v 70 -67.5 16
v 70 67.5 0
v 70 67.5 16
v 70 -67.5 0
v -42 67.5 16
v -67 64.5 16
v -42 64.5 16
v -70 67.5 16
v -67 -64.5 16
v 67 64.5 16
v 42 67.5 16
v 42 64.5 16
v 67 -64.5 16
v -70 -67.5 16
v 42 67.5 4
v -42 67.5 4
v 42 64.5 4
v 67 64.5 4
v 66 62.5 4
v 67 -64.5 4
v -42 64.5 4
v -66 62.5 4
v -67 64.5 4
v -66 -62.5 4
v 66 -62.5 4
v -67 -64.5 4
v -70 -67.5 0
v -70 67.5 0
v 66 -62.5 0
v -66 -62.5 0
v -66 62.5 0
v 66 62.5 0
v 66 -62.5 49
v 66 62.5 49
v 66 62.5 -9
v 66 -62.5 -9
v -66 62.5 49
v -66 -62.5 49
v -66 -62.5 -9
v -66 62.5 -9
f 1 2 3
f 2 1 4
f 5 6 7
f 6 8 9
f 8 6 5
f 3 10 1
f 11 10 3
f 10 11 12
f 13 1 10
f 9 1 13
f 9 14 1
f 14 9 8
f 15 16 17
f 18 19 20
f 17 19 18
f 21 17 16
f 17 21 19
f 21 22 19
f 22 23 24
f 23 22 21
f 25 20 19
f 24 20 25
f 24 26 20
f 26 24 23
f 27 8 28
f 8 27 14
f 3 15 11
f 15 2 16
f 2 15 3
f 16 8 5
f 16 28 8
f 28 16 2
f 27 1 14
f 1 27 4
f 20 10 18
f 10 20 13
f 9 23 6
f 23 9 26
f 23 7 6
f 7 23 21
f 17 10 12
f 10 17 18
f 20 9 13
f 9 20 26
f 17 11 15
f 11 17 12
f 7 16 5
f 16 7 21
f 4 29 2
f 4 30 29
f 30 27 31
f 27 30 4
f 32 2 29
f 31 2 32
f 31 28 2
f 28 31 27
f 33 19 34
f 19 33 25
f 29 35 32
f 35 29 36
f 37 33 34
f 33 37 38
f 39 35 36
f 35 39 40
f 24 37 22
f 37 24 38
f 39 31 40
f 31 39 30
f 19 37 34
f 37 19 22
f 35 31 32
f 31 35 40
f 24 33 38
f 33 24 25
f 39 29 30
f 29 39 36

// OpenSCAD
// LUME — Universal pod sled (#186)
//
// Hot-swap mounting for K11 (NucBox 8945HS) OR Mac mini M4 inside the
// pod. Same external footprint, same pod-floor fasteners, same
// ventilation. Compute-specific mounting moves to a swappable
// adapter plate that bolts to the base via a shared 100x100 hot-swap
// pattern.
//
// Three modules:
//   universal_sled_base()              base tray + pod mounts + intake vents
//   adapter_plate_k11()                K11 VESA75 + bottom-fan standoffs
//   adapter_plate_mac_mini_m4()        Mac mini M4 cradle (no VESA, bumpered)
//
// PART selector at the bottom. Render any single piece for printing or
// the full assembly for fit visualisation.
//
// Dimensions reference lume-config.scad for K11_*. Mac mini M4 numbers
// pinned from Apple spec sheet (caliper-verify on arrival).

include <lume-config.scad>

// ---- Mac mini M4 constants (caliper-verify on arrival) ----------------
MM_W = 127.0;   // width
MM_D = 127.0;   // depth
MM_H = 50.0;    // height
MM_FOOT_INSET = 12;     // rubber-foot pad inset from corner (Apple spec)
MM_FOOT_DIA   = 12;     // rubber-foot diameter
MM_REAR_PORT_CLEAR = 8; // mm cable bend radius behind rear port row

// ---- Hot-swap pattern (adapter -> base) -------------------------------
HOT_SWAP_PITCH = 100;   // bolt pattern square, mm
HOT_SWAP_BOLT_DIA = 4.4; // M4 clearance
HOT_SWAP_INSERT_DIA = 5.0; // heat-set insert ID for M4

// ---- Sled outer geometry ----------------------------------------------
// Pick the larger of K11 and Mac mini footprints, plus 4 mm clearance
// on each side, so either compute fits without sled-side adjustment.
US_W = max(K11_W, MM_W) + 8;          // 132+8 = 140; MM 127+8 = 135 -> takes max
US_D = max(K11_D, MM_D) + 8;
US_BASE_T = 4;                         // base plate thickness
US_RIM_H = 12;                         // retaining rim height
US_RIM_OPEN_BACK_FRAC = 0.6;           // fraction of back wall removed for cabling

// Pod-floor mount: corner clusters of M3 holes
US_POD_BOLT_DIA = 3.4;                 // M3 clearance
US_POD_BOLT_INSET = 8;                 // from sled corner

// Intake slots (live in the base plate)
US_INTAKE_SLOT_W = 8;
US_INTAKE_SLOT_D = 92;
US_INTAKE_SLOT_X_PITCH = 18;
US_INTAKE_SLOT_COUNT = 7;

// =======================================================================
// universal_sled_base()
// =======================================================================
module universal_sled_base() {
  difference() {
    union() {
      // Base plate
      translate([-US_W/2, -US_D/2, 0])
        cube([US_W, US_D, US_BASE_T]);

      // Three-sided retaining rim (back open for compute port access).
      translate([-US_W/2, -US_D/2, US_BASE_T])
        difference() {
          cube([US_W, US_D, US_RIM_H]);
          // Hollow inside
          translate([POD_WALL, POD_WALL, -1])
            cube([US_W - POD_WALL*2,
                  US_D - POD_WALL*2,
                  US_RIM_H + 2]);
          // Cut the back wall (where cables emerge)
          back_w = US_W * US_RIM_OPEN_BACK_FRAC;
          translate([-back_w/2 + US_W/2, US_D - POD_WALL - 1, -1])
            cube([back_w, POD_WALL + 2, US_RIM_H + 2]);
        }
    }

    // Bottom intake slots (CPU bottom-fan friendly: K11 needs them, Mac mini
    // doesn't but they don't hurt and improve passive convection).
    intake_x_start = -((US_INTAKE_SLOT_COUNT - 1) * US_INTAKE_SLOT_X_PITCH) / 2;
    for (i = [0 : US_INTAKE_SLOT_COUNT - 1])
      translate([intake_x_start + i * US_INTAKE_SLOT_X_PITCH, 0, -1])
        cube([US_INTAKE_SLOT_W, US_INTAKE_SLOT_D, US_BASE_T + 2], center=true);

    // Hot-swap bolt pattern: 100x100 square, M4 clearance through base.
    // Adapter plate bolts down INTO the sled via these holes.
    for (x = [-HOT_SWAP_PITCH/2, HOT_SWAP_PITCH/2],
         y = [-HOT_SWAP_PITCH/2, HOT_SWAP_PITCH/2])
      translate([x, y, -1])
        cylinder(d=HOT_SWAP_BOLT_DIA, h=US_BASE_T + 2, $fn=24);

    // 4 corner pod-floor mount holes (M3 into heat-set inserts in the pod
    // floor). Same 4-corner pattern as the legacy K11-only sled so a swap
    // doesn't require new pod inserts.
    for (x = [-US_W/2 + US_POD_BOLT_INSET, US_W/2 - US_POD_BOLT_INSET],
         y = [-US_D/2 + US_POD_BOLT_INSET, US_D/2 - US_POD_BOLT_INSET])
      translate([x, y, -1])
        cylinder(d=US_POD_BOLT_DIA, h=US_BASE_T + 2, $fn=18);
  }
}

// =======================================================================
// adapter_plate_k11()
// =======================================================================
// Bolts down to universal_sled_base via 100x100 hot-swap pattern.
// Provides K11 VESA75 bolt pattern + 12 mm bottom-fan standoffs.
module adapter_plate_k11() {
  ap_w = HOT_SWAP_PITCH + 24;
  ap_d = HOT_SWAP_PITCH + 24;
  ap_t = 4;
  standoff_h = K11_BOTTOM_CLEAR_MIN;

  difference() {
    union() {
      // Plate
      translate([-ap_w/2, -ap_d/2, 0])
        cube([ap_w, ap_d, ap_t]);

      // K11 VESA75 standoffs (cylinders rising above the plate)
      for (x = [-K11_VESA_PITCH/2, K11_VESA_PITCH/2],
           y = [-K11_VESA_PITCH/2, K11_VESA_PITCH/2])
        translate([x, y, ap_t])
          cylinder(d=10, h=standoff_h, $fn=32);
    }

    // K11 VESA75 bolt pass-throughs (M4 clearance) all the way through
    for (x = [-K11_VESA_PITCH/2, K11_VESA_PITCH/2],
         y = [-K11_VESA_PITCH/2, K11_VESA_PITCH/2])
      translate([x, y, -1])
        cylinder(d=4.4, h=ap_t + standoff_h + 2, $fn=24);

    // Hot-swap bolt holes (M4 clearance) — 100x100
    for (x = [-HOT_SWAP_PITCH/2, HOT_SWAP_PITCH/2],
         y = [-HOT_SWAP_PITCH/2, HOT_SWAP_PITCH/2])
      translate([x, y, -1])
        cylinder(d=HOT_SWAP_BOLT_DIA, h=ap_t + 2, $fn=24);

    // Inner relief slot — keeps the K11 bottom fan unblocked even at the
    // standoff perimeter.
    translate([0, 0, -1])
      cube([K11_VESA_PITCH - 16, K11_VESA_PITCH - 16, ap_t + 2], center=true);
  }
}

// =======================================================================
// adapter_plate_mac_mini_m4()
// =======================================================================
// Bolts down to universal_sled_base via the same 100x100 hot-swap pattern.
// Mac mini M4 has NO VESA — gravity sits on a bumper-pad floor with two
// soft-rubber side rails preventing slide. Cable strain relief at the rear.
module adapter_plate_mac_mini_m4() {
  ap_w = HOT_SWAP_PITCH + 24;
  ap_d = HOT_SWAP_PITCH + 24;
  ap_t = 4;
  // Cradle wall: short bumpers along the LEFT and RIGHT sides only,
  // leaving FRONT and REAR open for ports + cable bend radius.
  bumper_h = 6;       // mm above plate
  bumper_w = 4;       // wall thickness
  bumper_d = MM_D * 0.7;

  difference() {
    union() {
      // Plate
      translate([-ap_w/2, -ap_d/2, 0])
        cube([ap_w, ap_d, ap_t]);

      // Bumper rails (left, right). Inset slightly so Mac mini drops in
      // without scraping.
      cradle_inner_w = MM_W + 1.5;  // 0.75 mm clearance per side
      for (x_sign = [-1, 1])
        translate([x_sign * (cradle_inner_w/2 + bumper_w/2),
                   -bumper_d/2,
                   ap_t])
          cube([bumper_w, bumper_d, bumper_h], center=false);

      // 4 corner foot pads (rubber-foot-aligned bosses) — give the
      // Mac mini's rubber feet something firm to sit on.
      for (x_sign = [-1, 1], y_sign = [-1, 1])
        translate([x_sign * (MM_W/2 - MM_FOOT_INSET),
                   y_sign * (MM_D/2 - MM_FOOT_INSET),
                   ap_t])
          cylinder(d=MM_FOOT_DIA + 4, h=1.5, $fn=32);
    }

    // Hot-swap bolt holes (M4 clearance) — 100x100
    for (x = [-HOT_SWAP_PITCH/2, HOT_SWAP_PITCH/2],
         y = [-HOT_SWAP_PITCH/2, HOT_SWAP_PITCH/2])
      translate([x, y, -1])
        cylinder(d=HOT_SWAP_BOLT_DIA, h=ap_t + 2, $fn=24);

    // Air-flow window (Mac mini bottom is the intake on M-series; keep
    // air path open through the plate).
    translate([0, 0, -1])
      cube([MM_W - 30, MM_D - 30, ap_t + 2], center=true);
  }
}

// =======================================================================
// Render selector
// =======================================================================
PART = "assembly_k11";
//   "base"             - just the universal sled base
//   "adapter_k11"      - K11 adapter plate
//   "adapter_mac_mini" - Mac mini M4 adapter plate
//   "assembly_k11"     - sled + K11 adapter + K11 proxy (visual fit check)
//   "assembly_mac_mini"- sled + MM adapter + Mac mini proxy (visual fit check)
//   "all_print"        - 3 parts laid out for build-plate inspection

if (PART == "base")                  universal_sled_base();
else if (PART == "adapter_k11")      adapter_plate_k11();
else if (PART == "adapter_mac_mini") adapter_plate_mac_mini_m4();

else if (PART == "assembly_k11") {
  universal_sled_base();
  translate([0, 0, US_BASE_T]) adapter_plate_k11();
  // K11 proxy on top of standoffs
  translate([0, 0, US_BASE_T + 4 + K11_BOTTOM_CLEAR_MIN])
    color("#303040") cube([K11_W, K11_D, K11_H], center=true);
}
else if (PART == "assembly_mac_mini") {
  universal_sled_base();
  translate([0, 0, US_BASE_T]) adapter_plate_mac_mini_m4();
  // Mac mini proxy resting on cradle pads
  translate([0, 0, US_BASE_T + 4 + 1.5])
    color("#cccccc") cube([MM_W, MM_D, MM_H], center=true);
}
else if (PART == "all_print") {
  // 3 parts laid flat for build-plate review
  universal_sled_base();
  translate([US_W + 20, 0, 0]) adapter_plate_k11();
  translate([2 * (US_W + 20), 0, 0]) adapter_plate_mac_mini_m4();
}
else {
  // default: K11 assembly
  universal_sled_base();
  translate([0, 0, US_BASE_T]) adapter_plate_k11();
  translate([0, 0, US_BASE_T + 4 + K11_BOTTOM_CLEAR_MIN])
    color("#303040") cube([K11_W, K11_D, K11_H], center=true);
}
